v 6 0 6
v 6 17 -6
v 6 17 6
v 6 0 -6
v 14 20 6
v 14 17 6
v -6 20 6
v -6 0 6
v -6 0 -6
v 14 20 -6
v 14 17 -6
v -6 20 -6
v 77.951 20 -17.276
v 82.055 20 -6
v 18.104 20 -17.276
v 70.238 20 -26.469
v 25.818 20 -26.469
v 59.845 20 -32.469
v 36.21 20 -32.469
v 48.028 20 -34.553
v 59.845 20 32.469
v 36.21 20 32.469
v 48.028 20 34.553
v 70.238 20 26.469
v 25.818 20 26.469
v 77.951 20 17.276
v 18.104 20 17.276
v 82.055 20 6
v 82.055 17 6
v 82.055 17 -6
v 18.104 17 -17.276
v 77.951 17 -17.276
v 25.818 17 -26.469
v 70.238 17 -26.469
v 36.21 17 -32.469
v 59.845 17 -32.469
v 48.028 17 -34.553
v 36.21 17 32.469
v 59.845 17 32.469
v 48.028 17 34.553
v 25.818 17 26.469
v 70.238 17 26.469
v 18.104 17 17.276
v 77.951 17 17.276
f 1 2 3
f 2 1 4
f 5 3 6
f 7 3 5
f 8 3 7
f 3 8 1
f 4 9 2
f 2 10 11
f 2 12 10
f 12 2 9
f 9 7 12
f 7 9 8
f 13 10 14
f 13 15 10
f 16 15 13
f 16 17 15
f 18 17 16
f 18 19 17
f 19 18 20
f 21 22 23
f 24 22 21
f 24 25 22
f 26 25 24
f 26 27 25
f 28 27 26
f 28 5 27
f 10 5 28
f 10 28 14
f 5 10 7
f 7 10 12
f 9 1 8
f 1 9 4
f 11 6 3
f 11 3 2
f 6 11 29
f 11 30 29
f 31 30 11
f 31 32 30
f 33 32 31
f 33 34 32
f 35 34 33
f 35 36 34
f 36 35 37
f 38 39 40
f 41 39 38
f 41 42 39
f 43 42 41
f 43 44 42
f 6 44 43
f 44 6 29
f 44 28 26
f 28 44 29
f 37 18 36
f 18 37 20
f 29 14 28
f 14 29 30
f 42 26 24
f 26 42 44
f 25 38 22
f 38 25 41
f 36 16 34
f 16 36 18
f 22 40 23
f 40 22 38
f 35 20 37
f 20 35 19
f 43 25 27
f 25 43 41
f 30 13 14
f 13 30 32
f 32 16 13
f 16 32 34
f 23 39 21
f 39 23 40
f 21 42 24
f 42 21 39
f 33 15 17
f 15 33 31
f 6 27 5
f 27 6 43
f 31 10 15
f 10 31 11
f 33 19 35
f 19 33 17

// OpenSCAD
//
//
//

inner_radius = 24;
outer_radius = 36;
tower_height = 20;
thickness = 3;

walkway_length = 8;

landing_pad_slice_count = 18; // this indirectly controls the size of the pad
landing_pad_slice_sweep = 360 / landing_pad_slice_count;

width = outer_radius - inner_radius;
landing_pad_radius = (width / 2) / sin(landing_pad_slice_sweep / 2);
landing_pad_edge_radius = cos(landing_pad_slice_sweep / 2) * landing_pad_radius;


function bit_set(b, n) = floor(n / pow(2, b)) % 2 > 0;

module make_landing_pad() {
    rotate([0, landing_pad_slice_sweep / 2, 0])
    rotate([90, 0, 0])
    cylinder(h=thickness, r=landing_pad_radius, center=false, $fn=landing_pad_slice_count);
}

module make_landing_pad_old() {
    rotate([0, 90 + landing_pad_slice_sweep / 2, 0])
    union() {
        for (rotational_index=[0:1:landing_pad_slice_count-1]) {
            start_angle = (360.0 / landing_pad_slice_count) * rotational_index;
            end_angle = (360.0 / landing_pad_slice_count) * (rotational_index + 1);

            p03x = 0;
            p03y = 0 - thickness;
            p03z = 0;

            p12x = 0;
            p12y = 0;
            p12z = 0;

            p4x = landing_pad_radius * sin(start_angle);
            p4y = 0 - thickness;
            p4z = landing_pad_radius * cos(start_angle);

            p5x = landing_pad_radius * sin(start_angle);
            p5y = 0;
            p5z = landing_pad_radius * cos(start_angle);

            p6x = landing_pad_radius * sin(end_angle);
            p6y = 0;
            p6z = landing_pad_radius * cos(end_angle);

            p7x = landing_pad_radius * sin(end_angle);
            p7y =  0 - thickness;
            p7z = landing_pad_radius * cos(end_angle);

            section_points = [[p03x, p03y, p03z], // 0
                              [p12x, p12y, p12z], // 1
                              [p4x, p4y, p4z], // 2
                              [p5x, p5y, p5z], // 3
                              [p6x, p6y, p6z], // 4
                              [p7x, p7y, p7z]]; // 5
            polyhedron(points=section_points,
                       faces=[[0, 5, 2], // bottom
                              [1, 3, 4], // top
                              [2, 5, 4, 3]]); // outside
        }
    }
}

///////////////////////////////////////////////////////////////////////////////////


nth = 0;  // this is overridden by Makefile

if (nth == 0 || bit_set(0, nth)) {
    translate([-width / 2, 0, -width / 2])
        cube([width, tower_height, width], center = false);
}


if (nth == 0 || bit_set(1, nth)) {
    translate([width / 2, tower_height - thickness, -width / 2])
        cube([walkway_length, thickness, width], center = false);
}


if (nth == 0 || bit_set(2, nth)) {
    translate([landing_pad_edge_radius + width / 2 + walkway_length, tower_height, 0])
    make_landing_pad();
}
